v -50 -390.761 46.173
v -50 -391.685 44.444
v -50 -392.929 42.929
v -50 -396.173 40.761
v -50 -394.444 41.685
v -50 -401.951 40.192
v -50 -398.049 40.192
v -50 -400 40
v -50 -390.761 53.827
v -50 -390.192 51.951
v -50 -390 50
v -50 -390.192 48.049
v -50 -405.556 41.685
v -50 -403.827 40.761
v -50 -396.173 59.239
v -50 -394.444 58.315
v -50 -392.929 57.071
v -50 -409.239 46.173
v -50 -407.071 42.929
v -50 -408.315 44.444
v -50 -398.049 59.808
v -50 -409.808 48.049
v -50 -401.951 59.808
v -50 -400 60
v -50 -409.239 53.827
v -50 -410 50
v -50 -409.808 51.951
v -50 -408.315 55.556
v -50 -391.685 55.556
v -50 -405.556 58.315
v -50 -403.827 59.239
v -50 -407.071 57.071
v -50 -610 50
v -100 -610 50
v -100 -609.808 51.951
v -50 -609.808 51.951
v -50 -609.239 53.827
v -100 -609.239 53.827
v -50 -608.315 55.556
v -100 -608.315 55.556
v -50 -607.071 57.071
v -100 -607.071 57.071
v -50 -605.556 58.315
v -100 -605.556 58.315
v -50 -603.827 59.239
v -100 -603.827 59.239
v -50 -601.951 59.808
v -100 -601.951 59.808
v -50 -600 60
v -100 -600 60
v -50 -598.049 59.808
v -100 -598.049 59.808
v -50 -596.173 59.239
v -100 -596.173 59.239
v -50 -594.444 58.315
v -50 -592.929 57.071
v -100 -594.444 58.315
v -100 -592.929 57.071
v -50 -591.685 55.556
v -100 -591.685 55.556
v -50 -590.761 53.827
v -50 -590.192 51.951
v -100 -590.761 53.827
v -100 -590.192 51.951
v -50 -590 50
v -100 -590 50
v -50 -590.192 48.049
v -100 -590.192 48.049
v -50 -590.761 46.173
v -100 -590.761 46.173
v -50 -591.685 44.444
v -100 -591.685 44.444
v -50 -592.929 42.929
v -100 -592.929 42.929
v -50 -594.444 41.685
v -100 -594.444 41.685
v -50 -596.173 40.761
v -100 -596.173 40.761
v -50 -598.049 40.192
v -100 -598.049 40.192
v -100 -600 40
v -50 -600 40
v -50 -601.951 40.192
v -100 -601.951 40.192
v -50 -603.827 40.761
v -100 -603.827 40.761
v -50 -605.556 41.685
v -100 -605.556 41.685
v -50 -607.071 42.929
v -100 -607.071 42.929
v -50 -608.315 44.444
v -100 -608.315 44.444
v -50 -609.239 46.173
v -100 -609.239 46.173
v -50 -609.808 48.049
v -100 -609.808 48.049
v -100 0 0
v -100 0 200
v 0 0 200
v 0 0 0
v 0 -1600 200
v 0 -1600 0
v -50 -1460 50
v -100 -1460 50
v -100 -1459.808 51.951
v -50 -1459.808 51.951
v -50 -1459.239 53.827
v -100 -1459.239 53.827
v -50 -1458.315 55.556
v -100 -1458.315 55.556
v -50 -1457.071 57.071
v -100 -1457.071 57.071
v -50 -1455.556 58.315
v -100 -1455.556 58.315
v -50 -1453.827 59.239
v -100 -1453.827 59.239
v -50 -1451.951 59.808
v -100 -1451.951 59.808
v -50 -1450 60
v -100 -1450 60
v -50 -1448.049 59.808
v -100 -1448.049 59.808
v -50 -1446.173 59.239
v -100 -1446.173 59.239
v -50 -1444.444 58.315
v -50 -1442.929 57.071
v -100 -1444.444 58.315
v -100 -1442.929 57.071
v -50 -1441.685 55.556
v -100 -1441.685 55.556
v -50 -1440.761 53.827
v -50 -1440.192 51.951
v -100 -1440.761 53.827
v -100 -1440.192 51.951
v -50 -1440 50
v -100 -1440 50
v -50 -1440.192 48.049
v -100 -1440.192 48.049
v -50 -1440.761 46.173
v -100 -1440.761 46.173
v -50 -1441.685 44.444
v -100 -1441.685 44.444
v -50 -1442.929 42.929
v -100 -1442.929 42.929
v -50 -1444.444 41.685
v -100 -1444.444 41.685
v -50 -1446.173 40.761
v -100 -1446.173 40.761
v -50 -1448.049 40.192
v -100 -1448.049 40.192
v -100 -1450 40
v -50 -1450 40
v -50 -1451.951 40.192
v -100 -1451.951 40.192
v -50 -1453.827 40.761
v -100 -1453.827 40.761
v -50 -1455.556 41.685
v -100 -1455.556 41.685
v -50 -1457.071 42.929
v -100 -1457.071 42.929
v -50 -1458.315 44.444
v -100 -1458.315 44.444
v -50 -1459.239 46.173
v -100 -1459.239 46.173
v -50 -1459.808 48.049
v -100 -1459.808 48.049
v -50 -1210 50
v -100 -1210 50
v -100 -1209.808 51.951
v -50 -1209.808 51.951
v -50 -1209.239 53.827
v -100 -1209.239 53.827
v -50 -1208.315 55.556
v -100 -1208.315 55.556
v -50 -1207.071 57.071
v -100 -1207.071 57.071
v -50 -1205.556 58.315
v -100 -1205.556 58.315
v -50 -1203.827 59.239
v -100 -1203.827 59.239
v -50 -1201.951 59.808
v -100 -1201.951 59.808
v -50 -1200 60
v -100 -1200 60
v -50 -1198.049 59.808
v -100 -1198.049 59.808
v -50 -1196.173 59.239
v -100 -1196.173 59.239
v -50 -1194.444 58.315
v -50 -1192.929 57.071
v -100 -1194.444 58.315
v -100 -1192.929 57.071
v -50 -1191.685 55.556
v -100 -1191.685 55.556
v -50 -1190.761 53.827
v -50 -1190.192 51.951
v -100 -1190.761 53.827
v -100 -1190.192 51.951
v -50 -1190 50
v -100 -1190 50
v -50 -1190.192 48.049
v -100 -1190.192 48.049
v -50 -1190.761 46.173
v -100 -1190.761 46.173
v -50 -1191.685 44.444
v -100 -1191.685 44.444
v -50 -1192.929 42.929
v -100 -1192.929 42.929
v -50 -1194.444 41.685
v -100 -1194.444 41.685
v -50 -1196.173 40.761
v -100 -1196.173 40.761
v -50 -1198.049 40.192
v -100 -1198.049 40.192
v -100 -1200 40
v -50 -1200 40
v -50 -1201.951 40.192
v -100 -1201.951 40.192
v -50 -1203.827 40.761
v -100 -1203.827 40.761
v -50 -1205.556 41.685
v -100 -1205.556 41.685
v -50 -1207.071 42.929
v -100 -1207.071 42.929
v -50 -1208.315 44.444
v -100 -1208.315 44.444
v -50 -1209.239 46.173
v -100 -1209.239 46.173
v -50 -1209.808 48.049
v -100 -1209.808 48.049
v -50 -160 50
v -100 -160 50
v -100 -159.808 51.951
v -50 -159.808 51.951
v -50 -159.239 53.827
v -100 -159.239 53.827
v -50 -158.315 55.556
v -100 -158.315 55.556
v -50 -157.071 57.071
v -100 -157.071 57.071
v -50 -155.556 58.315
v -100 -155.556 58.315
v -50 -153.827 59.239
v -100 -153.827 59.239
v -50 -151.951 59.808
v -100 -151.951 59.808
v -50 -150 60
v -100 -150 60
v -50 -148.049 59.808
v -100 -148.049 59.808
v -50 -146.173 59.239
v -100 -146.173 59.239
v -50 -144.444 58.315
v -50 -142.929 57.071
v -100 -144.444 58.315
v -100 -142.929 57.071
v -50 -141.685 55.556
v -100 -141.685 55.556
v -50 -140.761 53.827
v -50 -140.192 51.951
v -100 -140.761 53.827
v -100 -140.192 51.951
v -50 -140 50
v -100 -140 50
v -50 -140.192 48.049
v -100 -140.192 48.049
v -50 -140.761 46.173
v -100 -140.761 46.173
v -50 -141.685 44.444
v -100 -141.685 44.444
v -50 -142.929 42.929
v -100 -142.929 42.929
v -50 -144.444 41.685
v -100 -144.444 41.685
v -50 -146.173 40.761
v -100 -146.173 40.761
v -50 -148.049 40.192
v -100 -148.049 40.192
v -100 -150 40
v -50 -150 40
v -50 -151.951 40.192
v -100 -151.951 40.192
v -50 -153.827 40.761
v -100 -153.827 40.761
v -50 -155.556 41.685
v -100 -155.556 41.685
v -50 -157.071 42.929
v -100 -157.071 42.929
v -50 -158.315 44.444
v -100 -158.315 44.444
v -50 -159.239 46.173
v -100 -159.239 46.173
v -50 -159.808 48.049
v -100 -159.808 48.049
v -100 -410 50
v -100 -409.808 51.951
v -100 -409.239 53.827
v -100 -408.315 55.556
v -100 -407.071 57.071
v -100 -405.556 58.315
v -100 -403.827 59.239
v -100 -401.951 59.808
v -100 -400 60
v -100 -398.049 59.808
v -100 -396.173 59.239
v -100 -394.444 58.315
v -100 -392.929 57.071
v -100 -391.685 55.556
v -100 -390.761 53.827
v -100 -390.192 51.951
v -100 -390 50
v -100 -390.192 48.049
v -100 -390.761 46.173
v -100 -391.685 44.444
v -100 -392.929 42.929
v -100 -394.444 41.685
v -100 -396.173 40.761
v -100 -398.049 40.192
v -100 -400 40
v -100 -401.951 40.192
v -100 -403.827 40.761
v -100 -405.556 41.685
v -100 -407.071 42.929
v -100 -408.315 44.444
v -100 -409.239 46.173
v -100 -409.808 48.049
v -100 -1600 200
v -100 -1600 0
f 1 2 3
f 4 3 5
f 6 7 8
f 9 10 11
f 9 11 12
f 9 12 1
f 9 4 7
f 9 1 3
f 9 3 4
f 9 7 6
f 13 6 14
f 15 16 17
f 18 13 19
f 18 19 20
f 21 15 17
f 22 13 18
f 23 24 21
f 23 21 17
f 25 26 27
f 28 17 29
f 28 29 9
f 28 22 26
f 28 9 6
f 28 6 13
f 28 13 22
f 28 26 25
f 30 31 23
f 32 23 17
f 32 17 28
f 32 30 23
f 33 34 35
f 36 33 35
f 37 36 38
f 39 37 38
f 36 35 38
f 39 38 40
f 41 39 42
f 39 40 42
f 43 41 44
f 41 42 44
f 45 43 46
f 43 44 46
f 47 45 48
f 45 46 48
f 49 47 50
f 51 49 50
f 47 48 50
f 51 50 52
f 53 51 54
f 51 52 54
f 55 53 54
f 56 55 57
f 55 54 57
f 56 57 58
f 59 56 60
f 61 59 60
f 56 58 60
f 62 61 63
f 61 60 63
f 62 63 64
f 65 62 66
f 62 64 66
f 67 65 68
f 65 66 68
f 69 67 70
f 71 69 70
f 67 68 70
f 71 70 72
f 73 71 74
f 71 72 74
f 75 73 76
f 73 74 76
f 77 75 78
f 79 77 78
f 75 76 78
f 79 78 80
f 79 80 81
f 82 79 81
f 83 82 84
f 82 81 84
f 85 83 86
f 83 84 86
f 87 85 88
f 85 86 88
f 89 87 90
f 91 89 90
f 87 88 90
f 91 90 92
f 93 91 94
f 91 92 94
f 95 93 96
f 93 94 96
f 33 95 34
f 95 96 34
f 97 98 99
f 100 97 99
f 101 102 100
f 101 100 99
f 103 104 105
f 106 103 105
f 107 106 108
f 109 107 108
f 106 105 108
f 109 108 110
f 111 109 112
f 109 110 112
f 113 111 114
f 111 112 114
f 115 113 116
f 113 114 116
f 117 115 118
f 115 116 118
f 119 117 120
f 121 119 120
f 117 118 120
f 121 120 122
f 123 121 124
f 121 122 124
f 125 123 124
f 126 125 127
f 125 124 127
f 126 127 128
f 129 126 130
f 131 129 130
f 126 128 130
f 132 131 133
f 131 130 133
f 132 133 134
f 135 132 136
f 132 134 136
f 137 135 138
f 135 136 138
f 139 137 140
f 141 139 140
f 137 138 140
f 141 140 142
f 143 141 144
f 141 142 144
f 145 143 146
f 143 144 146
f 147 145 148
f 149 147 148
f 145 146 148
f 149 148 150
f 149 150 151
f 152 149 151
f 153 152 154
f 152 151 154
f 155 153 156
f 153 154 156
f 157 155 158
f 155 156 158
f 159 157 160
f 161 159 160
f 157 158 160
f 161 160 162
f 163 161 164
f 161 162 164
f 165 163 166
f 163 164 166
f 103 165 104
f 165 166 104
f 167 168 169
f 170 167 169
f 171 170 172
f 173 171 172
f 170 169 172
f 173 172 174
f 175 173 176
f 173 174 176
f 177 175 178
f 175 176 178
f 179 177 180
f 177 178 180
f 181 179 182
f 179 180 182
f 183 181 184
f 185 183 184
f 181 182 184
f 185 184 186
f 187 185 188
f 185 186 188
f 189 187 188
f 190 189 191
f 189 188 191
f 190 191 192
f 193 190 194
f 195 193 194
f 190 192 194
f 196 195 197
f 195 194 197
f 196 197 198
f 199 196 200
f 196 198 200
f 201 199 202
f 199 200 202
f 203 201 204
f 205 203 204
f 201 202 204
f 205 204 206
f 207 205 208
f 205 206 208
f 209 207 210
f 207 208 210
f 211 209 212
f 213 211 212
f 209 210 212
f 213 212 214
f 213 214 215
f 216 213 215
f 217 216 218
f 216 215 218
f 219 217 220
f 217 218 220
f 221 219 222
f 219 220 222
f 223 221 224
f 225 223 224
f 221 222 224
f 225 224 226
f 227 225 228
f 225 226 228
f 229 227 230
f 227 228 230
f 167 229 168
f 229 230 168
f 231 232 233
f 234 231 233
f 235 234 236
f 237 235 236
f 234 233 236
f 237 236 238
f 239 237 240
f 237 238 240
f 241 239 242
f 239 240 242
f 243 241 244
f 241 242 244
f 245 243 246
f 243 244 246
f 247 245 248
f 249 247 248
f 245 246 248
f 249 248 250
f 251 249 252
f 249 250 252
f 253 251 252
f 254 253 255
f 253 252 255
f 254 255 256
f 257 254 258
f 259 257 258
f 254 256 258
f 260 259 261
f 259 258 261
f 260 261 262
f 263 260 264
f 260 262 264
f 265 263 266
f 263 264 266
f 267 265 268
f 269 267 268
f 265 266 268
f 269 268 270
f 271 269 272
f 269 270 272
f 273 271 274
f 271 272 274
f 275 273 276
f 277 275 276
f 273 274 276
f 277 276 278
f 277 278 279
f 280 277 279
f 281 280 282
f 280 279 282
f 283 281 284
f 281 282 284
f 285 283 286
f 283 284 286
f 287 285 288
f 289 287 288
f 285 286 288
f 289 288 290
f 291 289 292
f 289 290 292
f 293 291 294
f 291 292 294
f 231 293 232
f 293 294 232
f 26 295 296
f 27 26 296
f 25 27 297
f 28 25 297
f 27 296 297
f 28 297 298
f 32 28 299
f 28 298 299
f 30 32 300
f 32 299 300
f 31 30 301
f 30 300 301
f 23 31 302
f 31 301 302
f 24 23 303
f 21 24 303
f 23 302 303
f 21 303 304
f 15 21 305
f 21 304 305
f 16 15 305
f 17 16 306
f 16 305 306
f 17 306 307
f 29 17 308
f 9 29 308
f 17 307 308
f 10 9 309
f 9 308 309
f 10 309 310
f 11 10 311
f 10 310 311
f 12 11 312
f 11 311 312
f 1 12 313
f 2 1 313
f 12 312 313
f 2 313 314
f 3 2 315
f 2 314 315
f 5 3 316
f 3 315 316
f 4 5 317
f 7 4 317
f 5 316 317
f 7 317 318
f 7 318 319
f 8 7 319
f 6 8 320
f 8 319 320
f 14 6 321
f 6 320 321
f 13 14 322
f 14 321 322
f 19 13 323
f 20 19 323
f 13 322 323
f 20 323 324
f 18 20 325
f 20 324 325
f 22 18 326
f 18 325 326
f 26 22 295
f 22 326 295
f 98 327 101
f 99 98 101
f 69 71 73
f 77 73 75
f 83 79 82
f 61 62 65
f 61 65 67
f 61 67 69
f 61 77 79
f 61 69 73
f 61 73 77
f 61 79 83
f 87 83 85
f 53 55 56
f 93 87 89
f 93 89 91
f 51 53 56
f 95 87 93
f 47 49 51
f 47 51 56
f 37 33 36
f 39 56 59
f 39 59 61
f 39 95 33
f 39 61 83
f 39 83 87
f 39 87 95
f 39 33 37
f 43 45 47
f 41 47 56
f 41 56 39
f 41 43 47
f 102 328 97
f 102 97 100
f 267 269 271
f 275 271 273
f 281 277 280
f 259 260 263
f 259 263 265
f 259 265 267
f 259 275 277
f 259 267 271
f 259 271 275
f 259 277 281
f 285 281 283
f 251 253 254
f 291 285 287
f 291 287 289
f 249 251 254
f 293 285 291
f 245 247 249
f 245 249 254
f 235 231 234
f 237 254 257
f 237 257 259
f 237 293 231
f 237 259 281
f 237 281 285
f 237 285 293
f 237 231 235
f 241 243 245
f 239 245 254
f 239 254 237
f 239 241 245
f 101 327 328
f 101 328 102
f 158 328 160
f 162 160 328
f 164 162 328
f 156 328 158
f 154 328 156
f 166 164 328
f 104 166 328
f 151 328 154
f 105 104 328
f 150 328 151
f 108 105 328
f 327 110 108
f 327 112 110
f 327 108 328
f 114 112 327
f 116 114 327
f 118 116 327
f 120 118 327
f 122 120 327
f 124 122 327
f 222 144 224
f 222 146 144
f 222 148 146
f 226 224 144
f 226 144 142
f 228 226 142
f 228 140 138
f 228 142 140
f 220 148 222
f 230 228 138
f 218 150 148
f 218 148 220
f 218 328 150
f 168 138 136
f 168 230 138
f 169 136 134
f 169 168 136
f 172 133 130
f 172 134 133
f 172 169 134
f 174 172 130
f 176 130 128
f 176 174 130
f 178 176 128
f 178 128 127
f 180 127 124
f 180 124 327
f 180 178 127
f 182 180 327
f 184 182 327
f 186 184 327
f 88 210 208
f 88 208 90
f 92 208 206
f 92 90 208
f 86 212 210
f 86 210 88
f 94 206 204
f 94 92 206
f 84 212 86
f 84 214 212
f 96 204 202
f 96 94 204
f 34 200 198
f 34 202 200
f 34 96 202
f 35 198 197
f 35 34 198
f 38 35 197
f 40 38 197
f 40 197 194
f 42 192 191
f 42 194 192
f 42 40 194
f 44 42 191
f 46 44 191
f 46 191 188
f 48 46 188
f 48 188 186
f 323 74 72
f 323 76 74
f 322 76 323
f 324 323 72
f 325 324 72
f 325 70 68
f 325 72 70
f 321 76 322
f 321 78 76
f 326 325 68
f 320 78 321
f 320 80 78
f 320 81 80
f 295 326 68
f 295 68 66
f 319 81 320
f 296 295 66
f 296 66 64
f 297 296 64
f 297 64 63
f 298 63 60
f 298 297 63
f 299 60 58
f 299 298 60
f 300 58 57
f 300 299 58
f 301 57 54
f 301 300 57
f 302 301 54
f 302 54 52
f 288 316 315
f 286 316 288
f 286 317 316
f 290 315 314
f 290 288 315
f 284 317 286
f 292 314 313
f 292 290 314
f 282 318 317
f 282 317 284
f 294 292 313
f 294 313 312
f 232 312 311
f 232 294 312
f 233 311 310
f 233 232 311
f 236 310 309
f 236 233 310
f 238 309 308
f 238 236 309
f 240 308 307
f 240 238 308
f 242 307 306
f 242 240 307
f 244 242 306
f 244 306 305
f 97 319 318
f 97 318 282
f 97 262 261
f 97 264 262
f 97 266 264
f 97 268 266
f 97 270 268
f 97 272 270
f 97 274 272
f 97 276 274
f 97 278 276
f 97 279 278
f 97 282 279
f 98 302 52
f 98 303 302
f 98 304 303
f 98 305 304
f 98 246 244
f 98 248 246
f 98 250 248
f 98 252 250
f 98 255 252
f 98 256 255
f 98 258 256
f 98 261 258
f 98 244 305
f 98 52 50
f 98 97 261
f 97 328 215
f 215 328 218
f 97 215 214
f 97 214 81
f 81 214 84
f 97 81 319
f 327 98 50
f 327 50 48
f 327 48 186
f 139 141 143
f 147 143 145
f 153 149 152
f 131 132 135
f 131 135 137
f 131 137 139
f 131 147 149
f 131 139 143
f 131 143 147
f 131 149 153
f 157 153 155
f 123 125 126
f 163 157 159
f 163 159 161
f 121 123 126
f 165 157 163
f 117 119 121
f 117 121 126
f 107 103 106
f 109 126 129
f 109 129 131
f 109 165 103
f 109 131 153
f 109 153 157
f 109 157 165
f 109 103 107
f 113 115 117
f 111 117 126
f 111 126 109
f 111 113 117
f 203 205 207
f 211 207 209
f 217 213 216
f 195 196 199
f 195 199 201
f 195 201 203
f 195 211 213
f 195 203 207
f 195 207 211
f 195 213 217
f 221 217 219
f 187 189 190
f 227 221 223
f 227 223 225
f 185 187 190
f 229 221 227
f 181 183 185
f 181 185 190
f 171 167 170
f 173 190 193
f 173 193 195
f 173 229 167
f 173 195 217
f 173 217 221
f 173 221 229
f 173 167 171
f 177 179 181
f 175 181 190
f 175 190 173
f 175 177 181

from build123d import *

# Parameters (mm, degrees)
F0_W     = 100
F0_H     = 200
F1_DEPTH = 1600
F2_R     = 10
F3_DEPTH = 50


with BuildPart() as f1:
    # F0 (on Front) → F1 (new body)
    with BuildSketch(Plane.XZ):
        with Locations((-50, 100)):
            Rectangle(F0_W, F0_H)
    extrude(amount=F1_DEPTH)

    # F2 (on face) → F3 (cut)
    with BuildSketch(Plane(origin=(-100, 0, 0), x_dir=(0, -1, 0), z_dir=(-1, 0, 0))):
        with Locations((150, 50)):
            Circle(F2_R)
        with Locations((400, 50)):
            Circle(F2_R)
        with Locations((600, 50)):
            Circle(F2_R)
        with Locations((1200, 50)):
            Circle(F2_R)
        with Locations((1450, 50)):
            Circle(F2_R)
    extrude(amount=-F3_DEPTH, mode=Mode.SUBTRACT)


solid = f1.part
